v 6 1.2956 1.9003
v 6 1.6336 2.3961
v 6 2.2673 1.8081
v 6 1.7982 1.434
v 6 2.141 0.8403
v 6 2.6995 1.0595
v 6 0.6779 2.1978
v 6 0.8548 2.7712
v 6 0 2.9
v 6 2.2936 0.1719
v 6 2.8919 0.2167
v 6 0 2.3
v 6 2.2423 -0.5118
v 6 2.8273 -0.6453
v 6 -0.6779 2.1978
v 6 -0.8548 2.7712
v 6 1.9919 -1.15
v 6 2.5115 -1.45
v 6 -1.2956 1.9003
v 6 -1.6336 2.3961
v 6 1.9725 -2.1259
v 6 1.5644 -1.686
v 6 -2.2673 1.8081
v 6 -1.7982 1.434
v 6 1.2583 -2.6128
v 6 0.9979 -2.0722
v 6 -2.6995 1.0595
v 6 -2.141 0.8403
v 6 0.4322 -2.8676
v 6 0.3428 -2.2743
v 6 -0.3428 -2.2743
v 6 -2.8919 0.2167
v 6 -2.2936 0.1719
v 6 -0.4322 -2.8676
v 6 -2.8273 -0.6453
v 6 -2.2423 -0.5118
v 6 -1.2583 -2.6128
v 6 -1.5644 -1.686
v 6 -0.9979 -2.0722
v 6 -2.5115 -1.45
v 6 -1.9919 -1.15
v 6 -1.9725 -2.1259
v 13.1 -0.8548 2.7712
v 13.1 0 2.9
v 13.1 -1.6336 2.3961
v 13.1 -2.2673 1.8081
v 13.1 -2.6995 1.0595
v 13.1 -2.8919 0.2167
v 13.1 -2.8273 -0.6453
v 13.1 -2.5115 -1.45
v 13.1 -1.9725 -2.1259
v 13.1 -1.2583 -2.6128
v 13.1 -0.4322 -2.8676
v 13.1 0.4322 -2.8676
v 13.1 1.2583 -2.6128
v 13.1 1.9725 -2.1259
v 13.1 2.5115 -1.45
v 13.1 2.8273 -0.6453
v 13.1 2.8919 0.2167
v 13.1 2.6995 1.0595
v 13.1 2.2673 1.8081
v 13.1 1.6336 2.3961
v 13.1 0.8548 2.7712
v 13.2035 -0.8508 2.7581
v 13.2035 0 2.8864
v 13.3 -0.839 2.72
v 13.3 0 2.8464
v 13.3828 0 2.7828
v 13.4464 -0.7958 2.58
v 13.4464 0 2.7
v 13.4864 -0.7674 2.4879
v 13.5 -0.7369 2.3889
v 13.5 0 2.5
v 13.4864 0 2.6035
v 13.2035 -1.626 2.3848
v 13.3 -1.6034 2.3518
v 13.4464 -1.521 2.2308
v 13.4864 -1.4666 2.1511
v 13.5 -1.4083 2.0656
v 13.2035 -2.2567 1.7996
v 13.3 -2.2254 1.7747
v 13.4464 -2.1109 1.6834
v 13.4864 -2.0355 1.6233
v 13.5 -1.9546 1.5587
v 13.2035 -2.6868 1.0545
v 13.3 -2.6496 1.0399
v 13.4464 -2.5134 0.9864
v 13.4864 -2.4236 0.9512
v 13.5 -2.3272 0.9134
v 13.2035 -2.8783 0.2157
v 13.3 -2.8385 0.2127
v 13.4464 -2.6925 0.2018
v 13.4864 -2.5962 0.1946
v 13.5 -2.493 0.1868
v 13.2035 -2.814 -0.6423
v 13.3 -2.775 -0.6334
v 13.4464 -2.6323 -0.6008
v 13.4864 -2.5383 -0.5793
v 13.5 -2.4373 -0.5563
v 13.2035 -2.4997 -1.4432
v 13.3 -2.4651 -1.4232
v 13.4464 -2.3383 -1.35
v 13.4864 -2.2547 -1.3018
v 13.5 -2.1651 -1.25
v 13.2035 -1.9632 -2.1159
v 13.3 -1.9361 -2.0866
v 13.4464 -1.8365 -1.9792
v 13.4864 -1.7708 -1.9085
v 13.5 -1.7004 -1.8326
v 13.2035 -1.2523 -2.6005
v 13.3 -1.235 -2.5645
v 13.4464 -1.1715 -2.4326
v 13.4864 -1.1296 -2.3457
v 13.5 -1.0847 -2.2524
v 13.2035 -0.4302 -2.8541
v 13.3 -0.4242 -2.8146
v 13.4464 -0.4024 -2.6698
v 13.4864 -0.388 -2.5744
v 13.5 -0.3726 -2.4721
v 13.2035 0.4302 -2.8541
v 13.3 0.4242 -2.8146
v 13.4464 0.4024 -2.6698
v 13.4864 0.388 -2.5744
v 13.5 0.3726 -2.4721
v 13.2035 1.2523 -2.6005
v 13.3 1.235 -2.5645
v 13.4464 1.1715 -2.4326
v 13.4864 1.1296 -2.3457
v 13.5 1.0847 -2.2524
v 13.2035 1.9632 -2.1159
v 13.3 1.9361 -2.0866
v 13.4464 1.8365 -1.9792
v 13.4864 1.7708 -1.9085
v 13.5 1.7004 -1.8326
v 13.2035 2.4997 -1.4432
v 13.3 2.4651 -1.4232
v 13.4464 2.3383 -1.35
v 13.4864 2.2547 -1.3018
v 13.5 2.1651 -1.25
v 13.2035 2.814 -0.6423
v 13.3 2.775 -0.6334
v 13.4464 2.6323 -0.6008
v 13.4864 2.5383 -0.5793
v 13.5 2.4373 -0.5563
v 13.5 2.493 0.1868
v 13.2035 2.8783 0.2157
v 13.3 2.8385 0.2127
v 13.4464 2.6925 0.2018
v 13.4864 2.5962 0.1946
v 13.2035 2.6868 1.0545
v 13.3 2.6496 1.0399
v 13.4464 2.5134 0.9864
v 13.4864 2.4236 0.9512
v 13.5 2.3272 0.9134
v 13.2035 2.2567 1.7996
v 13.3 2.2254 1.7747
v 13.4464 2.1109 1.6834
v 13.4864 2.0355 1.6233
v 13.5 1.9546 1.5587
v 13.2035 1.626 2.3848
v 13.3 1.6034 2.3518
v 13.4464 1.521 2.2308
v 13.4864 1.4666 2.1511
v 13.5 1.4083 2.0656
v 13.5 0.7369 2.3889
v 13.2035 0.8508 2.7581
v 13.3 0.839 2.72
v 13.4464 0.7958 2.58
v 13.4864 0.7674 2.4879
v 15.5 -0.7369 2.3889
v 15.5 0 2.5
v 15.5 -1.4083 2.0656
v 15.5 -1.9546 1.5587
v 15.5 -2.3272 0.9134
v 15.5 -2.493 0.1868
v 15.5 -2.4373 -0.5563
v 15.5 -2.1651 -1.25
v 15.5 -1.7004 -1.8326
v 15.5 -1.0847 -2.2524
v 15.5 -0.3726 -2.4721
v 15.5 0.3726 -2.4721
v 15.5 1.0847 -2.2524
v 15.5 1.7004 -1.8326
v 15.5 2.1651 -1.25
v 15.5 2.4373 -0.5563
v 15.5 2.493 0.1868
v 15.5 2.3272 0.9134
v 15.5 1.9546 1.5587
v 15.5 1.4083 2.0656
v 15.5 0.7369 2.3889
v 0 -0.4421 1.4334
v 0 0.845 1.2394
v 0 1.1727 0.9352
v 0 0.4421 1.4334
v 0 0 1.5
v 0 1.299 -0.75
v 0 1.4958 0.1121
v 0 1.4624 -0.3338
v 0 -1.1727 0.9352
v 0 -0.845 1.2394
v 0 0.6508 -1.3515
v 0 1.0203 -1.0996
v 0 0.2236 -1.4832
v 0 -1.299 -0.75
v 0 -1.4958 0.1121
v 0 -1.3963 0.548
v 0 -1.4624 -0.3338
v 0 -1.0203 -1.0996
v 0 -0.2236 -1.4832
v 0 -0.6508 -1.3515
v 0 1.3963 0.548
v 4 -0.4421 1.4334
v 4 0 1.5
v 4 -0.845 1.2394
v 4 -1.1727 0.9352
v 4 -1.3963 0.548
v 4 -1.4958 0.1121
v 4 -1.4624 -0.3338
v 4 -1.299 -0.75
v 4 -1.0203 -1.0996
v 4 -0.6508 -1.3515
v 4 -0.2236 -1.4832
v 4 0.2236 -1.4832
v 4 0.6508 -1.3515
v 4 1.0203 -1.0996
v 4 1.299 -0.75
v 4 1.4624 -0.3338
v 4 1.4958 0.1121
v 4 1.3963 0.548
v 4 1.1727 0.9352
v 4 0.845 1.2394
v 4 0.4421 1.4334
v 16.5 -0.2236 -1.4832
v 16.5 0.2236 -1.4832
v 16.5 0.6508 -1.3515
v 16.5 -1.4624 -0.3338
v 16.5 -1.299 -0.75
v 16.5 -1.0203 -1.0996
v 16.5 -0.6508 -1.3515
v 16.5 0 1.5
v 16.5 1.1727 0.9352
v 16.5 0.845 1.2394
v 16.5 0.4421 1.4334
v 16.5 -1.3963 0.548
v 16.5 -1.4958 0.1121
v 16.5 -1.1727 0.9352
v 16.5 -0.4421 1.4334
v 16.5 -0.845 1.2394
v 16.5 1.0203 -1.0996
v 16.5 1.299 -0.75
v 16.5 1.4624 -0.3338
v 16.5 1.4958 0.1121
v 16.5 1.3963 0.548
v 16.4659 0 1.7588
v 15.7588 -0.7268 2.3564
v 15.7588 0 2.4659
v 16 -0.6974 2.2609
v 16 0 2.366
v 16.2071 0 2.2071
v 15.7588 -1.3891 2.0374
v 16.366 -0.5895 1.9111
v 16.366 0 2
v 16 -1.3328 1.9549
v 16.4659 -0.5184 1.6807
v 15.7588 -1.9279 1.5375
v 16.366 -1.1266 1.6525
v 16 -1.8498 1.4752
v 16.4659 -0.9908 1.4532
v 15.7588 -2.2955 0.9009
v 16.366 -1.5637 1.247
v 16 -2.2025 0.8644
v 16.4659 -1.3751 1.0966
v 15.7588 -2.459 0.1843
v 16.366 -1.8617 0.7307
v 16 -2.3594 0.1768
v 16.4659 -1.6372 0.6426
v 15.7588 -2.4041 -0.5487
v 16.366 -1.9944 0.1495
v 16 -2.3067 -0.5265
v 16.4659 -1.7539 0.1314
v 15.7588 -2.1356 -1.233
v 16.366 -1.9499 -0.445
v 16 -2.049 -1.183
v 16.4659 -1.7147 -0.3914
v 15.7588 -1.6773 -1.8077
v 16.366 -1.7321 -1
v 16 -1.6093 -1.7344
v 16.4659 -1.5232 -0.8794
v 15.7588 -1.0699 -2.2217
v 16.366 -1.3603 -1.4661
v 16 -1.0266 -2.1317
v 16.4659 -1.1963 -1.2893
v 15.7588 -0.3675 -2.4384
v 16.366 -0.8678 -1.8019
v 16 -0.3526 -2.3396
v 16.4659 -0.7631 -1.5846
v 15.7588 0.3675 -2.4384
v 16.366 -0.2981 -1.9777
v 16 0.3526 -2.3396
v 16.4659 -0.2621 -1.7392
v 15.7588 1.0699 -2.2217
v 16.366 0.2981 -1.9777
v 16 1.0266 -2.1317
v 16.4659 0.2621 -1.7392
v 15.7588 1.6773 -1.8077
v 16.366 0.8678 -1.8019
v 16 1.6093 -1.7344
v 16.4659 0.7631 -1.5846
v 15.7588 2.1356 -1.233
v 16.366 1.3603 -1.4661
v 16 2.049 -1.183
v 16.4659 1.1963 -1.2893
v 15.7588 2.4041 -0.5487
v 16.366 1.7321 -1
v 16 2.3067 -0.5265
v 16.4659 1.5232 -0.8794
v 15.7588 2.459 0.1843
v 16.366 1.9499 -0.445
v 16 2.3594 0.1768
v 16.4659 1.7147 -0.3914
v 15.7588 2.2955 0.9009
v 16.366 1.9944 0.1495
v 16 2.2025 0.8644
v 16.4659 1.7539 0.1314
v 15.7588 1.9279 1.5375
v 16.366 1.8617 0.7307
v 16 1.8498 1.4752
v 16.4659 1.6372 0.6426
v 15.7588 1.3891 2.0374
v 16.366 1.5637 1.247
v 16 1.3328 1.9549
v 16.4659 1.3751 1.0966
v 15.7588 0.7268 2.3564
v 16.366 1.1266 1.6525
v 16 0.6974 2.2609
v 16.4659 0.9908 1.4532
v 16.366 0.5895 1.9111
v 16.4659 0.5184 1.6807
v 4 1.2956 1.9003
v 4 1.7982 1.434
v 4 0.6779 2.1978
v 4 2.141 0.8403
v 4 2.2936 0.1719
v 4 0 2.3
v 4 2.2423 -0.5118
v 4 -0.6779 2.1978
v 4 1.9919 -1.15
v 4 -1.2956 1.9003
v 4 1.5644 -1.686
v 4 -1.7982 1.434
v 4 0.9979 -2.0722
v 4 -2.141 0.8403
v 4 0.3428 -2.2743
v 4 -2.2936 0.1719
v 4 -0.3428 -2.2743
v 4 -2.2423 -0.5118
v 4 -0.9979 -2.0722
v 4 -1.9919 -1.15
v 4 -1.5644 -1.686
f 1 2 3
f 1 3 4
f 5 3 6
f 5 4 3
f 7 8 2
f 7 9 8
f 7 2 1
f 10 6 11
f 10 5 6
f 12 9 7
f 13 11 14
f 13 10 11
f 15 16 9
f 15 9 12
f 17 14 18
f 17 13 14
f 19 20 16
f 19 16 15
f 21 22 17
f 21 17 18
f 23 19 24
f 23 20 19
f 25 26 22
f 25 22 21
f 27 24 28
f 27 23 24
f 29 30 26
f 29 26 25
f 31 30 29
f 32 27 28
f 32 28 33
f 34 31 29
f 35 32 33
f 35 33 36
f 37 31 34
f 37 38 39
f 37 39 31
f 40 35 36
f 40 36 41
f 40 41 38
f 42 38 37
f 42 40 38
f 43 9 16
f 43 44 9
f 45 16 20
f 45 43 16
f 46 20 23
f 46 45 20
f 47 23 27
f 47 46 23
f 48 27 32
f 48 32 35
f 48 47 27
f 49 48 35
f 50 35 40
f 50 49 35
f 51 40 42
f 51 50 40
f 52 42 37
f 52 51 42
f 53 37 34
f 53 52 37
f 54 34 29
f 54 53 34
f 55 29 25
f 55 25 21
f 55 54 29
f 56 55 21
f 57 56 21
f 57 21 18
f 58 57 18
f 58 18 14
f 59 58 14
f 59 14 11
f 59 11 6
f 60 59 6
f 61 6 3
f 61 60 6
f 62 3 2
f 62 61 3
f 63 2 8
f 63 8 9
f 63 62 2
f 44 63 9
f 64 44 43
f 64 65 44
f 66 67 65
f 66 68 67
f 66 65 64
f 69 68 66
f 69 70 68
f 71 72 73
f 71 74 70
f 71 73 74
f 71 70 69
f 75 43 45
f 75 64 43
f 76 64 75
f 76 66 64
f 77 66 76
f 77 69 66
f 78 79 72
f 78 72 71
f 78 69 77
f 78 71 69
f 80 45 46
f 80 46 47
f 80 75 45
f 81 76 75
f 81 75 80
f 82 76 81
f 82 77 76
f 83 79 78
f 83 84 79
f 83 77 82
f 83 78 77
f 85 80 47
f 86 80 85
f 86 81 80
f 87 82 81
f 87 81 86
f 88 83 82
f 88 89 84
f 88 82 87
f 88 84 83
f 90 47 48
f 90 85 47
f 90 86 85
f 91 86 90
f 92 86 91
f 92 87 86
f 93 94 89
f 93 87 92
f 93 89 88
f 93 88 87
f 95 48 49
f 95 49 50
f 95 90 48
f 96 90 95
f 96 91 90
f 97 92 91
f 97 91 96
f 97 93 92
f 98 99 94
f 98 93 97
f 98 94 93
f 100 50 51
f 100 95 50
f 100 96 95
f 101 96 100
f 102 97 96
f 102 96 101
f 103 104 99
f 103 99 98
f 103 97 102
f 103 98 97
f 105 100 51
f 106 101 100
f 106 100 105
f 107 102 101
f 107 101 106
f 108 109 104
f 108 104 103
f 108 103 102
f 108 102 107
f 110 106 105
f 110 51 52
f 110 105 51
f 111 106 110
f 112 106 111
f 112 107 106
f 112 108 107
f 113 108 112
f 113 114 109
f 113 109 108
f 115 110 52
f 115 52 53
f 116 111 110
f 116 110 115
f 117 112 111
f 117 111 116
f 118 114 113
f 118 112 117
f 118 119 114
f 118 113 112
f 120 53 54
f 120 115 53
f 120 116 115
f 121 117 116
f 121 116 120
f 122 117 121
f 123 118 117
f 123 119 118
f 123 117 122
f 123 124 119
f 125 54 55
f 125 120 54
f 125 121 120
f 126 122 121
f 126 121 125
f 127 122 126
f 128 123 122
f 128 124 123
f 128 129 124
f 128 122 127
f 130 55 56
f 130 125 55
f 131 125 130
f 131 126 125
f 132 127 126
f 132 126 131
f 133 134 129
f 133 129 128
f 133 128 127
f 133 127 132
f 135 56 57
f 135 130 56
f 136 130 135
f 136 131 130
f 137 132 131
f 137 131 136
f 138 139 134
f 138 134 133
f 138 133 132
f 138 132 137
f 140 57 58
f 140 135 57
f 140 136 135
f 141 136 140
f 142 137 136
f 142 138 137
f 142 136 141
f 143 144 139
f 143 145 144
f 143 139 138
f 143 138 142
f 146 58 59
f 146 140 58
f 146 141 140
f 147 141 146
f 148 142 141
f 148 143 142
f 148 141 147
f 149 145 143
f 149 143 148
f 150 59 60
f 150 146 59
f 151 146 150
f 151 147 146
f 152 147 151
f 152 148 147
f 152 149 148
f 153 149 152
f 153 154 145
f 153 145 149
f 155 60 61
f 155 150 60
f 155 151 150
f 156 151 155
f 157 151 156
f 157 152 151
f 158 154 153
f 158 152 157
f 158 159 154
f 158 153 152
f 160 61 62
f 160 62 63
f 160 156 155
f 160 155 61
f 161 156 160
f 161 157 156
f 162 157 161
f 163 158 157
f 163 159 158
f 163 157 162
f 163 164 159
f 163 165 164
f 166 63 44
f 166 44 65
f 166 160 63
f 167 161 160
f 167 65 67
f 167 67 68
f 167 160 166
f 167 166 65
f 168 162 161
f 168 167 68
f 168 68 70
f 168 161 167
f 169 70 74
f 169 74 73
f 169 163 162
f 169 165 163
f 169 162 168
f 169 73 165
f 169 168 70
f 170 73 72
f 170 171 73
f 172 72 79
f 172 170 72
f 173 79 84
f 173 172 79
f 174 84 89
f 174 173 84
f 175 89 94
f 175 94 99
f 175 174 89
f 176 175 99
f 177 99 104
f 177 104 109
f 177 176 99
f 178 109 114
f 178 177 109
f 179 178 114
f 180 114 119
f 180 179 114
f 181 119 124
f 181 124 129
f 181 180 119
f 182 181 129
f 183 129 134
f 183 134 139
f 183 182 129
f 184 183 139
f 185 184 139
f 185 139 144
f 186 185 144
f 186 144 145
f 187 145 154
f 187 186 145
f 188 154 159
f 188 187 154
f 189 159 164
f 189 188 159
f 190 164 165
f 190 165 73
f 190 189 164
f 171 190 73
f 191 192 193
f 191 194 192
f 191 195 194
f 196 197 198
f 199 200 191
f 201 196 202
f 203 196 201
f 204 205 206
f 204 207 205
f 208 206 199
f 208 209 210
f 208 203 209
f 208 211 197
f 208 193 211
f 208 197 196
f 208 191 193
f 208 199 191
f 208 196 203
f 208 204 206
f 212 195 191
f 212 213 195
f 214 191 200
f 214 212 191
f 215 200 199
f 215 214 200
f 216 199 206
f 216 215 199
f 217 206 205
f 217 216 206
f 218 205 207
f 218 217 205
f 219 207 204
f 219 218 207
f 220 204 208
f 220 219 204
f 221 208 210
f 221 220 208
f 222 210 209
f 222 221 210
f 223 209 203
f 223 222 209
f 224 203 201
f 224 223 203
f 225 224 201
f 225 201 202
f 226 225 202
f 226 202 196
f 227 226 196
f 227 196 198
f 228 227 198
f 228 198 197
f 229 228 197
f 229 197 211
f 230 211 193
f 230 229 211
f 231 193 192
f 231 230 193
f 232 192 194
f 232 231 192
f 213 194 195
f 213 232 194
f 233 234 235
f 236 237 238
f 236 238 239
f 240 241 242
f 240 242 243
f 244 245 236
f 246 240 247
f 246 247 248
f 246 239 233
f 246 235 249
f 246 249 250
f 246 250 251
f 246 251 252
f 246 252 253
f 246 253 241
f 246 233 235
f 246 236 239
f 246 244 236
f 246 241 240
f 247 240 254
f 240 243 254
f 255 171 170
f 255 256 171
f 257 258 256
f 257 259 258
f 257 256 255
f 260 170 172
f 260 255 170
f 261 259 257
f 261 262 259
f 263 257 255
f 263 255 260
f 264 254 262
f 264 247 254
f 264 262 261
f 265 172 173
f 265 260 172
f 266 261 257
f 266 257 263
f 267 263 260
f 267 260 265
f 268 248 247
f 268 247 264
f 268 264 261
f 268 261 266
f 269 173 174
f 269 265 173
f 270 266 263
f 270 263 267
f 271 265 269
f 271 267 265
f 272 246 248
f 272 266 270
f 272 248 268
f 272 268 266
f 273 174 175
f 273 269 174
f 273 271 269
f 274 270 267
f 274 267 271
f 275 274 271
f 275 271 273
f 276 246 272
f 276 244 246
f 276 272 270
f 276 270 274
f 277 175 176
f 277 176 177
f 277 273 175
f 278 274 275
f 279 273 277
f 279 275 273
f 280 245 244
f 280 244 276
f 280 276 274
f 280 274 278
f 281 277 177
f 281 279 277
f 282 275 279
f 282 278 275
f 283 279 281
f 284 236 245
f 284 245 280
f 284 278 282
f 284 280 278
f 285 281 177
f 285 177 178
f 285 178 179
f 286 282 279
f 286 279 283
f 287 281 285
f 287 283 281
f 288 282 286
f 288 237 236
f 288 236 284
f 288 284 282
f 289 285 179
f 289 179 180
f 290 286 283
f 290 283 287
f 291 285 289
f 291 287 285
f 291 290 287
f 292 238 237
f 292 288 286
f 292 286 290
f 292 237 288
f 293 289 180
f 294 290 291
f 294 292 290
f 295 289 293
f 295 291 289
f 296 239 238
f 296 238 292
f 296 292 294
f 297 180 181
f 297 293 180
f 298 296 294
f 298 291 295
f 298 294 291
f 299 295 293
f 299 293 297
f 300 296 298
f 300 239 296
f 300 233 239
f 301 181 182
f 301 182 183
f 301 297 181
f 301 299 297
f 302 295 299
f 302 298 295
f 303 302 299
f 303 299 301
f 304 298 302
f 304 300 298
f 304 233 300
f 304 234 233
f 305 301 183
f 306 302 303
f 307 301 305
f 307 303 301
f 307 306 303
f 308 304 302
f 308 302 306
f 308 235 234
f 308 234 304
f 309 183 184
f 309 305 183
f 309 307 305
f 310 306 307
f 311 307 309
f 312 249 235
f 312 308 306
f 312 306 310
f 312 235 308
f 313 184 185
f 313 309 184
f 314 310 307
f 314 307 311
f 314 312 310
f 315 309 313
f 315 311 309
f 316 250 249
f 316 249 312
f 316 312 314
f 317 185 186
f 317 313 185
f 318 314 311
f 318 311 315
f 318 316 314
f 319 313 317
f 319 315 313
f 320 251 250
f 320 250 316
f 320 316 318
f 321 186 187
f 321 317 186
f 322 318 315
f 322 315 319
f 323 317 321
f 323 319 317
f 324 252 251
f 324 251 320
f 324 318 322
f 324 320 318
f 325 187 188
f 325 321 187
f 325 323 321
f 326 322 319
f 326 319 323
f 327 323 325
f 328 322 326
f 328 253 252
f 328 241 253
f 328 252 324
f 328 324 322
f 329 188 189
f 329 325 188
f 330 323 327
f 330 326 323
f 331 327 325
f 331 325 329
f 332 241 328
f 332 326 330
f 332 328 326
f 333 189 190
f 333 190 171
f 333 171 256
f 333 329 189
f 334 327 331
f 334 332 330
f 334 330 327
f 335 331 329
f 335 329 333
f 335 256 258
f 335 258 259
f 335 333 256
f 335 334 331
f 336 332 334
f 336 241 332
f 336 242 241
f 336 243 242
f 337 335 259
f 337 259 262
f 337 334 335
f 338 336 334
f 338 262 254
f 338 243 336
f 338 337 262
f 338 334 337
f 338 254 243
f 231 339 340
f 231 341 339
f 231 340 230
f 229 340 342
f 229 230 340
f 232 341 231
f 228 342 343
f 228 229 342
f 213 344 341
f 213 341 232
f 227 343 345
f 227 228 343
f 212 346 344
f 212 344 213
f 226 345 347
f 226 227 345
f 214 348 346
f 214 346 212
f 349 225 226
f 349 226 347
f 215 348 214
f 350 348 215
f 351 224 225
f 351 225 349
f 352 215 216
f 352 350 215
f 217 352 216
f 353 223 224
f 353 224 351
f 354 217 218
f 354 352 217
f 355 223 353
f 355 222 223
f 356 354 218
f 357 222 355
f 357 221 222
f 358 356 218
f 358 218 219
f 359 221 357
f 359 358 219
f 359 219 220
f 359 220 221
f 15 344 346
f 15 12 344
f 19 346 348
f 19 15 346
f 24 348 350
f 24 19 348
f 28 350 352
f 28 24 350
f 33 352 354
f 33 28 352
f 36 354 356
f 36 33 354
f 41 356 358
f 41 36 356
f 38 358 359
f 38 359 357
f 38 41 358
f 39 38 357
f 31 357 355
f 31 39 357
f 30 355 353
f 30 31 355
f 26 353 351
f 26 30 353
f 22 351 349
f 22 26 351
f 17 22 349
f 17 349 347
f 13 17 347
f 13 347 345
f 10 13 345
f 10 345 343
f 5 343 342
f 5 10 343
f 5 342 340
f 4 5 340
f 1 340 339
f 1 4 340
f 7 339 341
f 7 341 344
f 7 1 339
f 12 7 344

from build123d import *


with BuildPart() as part:
    # 草图1 → 旋转1 (revolve)
    with BuildSketch(Plane.XY, mode=Mode.PRIVATE) as revolve_1_sk:
        with BuildLine():
            Line((0, 0), (0, 1.5))
            Line((0, 1.5), (4, 1.5))
            Line((4, 1.5), (4, 2.3))
            Line((4, 2.3), (6, 2.3))
            Line((6, 2.3), (6, 2.9))
            Line((6, 2.9), (13.1, 2.9))
            ThreePointArc((13.1, 2.9), (13.382842712, 2.782842712), (13.5, 2.5))
            Line((13.5, 2.5), (15.5, 2.5))
            ThreePointArc((15.5, 2.5), (16.207106781, 2.207106781), (16.5, 1.5))
            Line((16.5, 1.5), (16.5, 0))
            Line((16.5, 0), (0, 0))
        make_face()
    revolve(revolve_1_sk.sketch.rotate(Axis((-9.404400031, 0, 0), (1, 0, 0)), 90), axis=Axis((-9.404400031, 0, 0), (1, 0, 0)))


solid = part.part
